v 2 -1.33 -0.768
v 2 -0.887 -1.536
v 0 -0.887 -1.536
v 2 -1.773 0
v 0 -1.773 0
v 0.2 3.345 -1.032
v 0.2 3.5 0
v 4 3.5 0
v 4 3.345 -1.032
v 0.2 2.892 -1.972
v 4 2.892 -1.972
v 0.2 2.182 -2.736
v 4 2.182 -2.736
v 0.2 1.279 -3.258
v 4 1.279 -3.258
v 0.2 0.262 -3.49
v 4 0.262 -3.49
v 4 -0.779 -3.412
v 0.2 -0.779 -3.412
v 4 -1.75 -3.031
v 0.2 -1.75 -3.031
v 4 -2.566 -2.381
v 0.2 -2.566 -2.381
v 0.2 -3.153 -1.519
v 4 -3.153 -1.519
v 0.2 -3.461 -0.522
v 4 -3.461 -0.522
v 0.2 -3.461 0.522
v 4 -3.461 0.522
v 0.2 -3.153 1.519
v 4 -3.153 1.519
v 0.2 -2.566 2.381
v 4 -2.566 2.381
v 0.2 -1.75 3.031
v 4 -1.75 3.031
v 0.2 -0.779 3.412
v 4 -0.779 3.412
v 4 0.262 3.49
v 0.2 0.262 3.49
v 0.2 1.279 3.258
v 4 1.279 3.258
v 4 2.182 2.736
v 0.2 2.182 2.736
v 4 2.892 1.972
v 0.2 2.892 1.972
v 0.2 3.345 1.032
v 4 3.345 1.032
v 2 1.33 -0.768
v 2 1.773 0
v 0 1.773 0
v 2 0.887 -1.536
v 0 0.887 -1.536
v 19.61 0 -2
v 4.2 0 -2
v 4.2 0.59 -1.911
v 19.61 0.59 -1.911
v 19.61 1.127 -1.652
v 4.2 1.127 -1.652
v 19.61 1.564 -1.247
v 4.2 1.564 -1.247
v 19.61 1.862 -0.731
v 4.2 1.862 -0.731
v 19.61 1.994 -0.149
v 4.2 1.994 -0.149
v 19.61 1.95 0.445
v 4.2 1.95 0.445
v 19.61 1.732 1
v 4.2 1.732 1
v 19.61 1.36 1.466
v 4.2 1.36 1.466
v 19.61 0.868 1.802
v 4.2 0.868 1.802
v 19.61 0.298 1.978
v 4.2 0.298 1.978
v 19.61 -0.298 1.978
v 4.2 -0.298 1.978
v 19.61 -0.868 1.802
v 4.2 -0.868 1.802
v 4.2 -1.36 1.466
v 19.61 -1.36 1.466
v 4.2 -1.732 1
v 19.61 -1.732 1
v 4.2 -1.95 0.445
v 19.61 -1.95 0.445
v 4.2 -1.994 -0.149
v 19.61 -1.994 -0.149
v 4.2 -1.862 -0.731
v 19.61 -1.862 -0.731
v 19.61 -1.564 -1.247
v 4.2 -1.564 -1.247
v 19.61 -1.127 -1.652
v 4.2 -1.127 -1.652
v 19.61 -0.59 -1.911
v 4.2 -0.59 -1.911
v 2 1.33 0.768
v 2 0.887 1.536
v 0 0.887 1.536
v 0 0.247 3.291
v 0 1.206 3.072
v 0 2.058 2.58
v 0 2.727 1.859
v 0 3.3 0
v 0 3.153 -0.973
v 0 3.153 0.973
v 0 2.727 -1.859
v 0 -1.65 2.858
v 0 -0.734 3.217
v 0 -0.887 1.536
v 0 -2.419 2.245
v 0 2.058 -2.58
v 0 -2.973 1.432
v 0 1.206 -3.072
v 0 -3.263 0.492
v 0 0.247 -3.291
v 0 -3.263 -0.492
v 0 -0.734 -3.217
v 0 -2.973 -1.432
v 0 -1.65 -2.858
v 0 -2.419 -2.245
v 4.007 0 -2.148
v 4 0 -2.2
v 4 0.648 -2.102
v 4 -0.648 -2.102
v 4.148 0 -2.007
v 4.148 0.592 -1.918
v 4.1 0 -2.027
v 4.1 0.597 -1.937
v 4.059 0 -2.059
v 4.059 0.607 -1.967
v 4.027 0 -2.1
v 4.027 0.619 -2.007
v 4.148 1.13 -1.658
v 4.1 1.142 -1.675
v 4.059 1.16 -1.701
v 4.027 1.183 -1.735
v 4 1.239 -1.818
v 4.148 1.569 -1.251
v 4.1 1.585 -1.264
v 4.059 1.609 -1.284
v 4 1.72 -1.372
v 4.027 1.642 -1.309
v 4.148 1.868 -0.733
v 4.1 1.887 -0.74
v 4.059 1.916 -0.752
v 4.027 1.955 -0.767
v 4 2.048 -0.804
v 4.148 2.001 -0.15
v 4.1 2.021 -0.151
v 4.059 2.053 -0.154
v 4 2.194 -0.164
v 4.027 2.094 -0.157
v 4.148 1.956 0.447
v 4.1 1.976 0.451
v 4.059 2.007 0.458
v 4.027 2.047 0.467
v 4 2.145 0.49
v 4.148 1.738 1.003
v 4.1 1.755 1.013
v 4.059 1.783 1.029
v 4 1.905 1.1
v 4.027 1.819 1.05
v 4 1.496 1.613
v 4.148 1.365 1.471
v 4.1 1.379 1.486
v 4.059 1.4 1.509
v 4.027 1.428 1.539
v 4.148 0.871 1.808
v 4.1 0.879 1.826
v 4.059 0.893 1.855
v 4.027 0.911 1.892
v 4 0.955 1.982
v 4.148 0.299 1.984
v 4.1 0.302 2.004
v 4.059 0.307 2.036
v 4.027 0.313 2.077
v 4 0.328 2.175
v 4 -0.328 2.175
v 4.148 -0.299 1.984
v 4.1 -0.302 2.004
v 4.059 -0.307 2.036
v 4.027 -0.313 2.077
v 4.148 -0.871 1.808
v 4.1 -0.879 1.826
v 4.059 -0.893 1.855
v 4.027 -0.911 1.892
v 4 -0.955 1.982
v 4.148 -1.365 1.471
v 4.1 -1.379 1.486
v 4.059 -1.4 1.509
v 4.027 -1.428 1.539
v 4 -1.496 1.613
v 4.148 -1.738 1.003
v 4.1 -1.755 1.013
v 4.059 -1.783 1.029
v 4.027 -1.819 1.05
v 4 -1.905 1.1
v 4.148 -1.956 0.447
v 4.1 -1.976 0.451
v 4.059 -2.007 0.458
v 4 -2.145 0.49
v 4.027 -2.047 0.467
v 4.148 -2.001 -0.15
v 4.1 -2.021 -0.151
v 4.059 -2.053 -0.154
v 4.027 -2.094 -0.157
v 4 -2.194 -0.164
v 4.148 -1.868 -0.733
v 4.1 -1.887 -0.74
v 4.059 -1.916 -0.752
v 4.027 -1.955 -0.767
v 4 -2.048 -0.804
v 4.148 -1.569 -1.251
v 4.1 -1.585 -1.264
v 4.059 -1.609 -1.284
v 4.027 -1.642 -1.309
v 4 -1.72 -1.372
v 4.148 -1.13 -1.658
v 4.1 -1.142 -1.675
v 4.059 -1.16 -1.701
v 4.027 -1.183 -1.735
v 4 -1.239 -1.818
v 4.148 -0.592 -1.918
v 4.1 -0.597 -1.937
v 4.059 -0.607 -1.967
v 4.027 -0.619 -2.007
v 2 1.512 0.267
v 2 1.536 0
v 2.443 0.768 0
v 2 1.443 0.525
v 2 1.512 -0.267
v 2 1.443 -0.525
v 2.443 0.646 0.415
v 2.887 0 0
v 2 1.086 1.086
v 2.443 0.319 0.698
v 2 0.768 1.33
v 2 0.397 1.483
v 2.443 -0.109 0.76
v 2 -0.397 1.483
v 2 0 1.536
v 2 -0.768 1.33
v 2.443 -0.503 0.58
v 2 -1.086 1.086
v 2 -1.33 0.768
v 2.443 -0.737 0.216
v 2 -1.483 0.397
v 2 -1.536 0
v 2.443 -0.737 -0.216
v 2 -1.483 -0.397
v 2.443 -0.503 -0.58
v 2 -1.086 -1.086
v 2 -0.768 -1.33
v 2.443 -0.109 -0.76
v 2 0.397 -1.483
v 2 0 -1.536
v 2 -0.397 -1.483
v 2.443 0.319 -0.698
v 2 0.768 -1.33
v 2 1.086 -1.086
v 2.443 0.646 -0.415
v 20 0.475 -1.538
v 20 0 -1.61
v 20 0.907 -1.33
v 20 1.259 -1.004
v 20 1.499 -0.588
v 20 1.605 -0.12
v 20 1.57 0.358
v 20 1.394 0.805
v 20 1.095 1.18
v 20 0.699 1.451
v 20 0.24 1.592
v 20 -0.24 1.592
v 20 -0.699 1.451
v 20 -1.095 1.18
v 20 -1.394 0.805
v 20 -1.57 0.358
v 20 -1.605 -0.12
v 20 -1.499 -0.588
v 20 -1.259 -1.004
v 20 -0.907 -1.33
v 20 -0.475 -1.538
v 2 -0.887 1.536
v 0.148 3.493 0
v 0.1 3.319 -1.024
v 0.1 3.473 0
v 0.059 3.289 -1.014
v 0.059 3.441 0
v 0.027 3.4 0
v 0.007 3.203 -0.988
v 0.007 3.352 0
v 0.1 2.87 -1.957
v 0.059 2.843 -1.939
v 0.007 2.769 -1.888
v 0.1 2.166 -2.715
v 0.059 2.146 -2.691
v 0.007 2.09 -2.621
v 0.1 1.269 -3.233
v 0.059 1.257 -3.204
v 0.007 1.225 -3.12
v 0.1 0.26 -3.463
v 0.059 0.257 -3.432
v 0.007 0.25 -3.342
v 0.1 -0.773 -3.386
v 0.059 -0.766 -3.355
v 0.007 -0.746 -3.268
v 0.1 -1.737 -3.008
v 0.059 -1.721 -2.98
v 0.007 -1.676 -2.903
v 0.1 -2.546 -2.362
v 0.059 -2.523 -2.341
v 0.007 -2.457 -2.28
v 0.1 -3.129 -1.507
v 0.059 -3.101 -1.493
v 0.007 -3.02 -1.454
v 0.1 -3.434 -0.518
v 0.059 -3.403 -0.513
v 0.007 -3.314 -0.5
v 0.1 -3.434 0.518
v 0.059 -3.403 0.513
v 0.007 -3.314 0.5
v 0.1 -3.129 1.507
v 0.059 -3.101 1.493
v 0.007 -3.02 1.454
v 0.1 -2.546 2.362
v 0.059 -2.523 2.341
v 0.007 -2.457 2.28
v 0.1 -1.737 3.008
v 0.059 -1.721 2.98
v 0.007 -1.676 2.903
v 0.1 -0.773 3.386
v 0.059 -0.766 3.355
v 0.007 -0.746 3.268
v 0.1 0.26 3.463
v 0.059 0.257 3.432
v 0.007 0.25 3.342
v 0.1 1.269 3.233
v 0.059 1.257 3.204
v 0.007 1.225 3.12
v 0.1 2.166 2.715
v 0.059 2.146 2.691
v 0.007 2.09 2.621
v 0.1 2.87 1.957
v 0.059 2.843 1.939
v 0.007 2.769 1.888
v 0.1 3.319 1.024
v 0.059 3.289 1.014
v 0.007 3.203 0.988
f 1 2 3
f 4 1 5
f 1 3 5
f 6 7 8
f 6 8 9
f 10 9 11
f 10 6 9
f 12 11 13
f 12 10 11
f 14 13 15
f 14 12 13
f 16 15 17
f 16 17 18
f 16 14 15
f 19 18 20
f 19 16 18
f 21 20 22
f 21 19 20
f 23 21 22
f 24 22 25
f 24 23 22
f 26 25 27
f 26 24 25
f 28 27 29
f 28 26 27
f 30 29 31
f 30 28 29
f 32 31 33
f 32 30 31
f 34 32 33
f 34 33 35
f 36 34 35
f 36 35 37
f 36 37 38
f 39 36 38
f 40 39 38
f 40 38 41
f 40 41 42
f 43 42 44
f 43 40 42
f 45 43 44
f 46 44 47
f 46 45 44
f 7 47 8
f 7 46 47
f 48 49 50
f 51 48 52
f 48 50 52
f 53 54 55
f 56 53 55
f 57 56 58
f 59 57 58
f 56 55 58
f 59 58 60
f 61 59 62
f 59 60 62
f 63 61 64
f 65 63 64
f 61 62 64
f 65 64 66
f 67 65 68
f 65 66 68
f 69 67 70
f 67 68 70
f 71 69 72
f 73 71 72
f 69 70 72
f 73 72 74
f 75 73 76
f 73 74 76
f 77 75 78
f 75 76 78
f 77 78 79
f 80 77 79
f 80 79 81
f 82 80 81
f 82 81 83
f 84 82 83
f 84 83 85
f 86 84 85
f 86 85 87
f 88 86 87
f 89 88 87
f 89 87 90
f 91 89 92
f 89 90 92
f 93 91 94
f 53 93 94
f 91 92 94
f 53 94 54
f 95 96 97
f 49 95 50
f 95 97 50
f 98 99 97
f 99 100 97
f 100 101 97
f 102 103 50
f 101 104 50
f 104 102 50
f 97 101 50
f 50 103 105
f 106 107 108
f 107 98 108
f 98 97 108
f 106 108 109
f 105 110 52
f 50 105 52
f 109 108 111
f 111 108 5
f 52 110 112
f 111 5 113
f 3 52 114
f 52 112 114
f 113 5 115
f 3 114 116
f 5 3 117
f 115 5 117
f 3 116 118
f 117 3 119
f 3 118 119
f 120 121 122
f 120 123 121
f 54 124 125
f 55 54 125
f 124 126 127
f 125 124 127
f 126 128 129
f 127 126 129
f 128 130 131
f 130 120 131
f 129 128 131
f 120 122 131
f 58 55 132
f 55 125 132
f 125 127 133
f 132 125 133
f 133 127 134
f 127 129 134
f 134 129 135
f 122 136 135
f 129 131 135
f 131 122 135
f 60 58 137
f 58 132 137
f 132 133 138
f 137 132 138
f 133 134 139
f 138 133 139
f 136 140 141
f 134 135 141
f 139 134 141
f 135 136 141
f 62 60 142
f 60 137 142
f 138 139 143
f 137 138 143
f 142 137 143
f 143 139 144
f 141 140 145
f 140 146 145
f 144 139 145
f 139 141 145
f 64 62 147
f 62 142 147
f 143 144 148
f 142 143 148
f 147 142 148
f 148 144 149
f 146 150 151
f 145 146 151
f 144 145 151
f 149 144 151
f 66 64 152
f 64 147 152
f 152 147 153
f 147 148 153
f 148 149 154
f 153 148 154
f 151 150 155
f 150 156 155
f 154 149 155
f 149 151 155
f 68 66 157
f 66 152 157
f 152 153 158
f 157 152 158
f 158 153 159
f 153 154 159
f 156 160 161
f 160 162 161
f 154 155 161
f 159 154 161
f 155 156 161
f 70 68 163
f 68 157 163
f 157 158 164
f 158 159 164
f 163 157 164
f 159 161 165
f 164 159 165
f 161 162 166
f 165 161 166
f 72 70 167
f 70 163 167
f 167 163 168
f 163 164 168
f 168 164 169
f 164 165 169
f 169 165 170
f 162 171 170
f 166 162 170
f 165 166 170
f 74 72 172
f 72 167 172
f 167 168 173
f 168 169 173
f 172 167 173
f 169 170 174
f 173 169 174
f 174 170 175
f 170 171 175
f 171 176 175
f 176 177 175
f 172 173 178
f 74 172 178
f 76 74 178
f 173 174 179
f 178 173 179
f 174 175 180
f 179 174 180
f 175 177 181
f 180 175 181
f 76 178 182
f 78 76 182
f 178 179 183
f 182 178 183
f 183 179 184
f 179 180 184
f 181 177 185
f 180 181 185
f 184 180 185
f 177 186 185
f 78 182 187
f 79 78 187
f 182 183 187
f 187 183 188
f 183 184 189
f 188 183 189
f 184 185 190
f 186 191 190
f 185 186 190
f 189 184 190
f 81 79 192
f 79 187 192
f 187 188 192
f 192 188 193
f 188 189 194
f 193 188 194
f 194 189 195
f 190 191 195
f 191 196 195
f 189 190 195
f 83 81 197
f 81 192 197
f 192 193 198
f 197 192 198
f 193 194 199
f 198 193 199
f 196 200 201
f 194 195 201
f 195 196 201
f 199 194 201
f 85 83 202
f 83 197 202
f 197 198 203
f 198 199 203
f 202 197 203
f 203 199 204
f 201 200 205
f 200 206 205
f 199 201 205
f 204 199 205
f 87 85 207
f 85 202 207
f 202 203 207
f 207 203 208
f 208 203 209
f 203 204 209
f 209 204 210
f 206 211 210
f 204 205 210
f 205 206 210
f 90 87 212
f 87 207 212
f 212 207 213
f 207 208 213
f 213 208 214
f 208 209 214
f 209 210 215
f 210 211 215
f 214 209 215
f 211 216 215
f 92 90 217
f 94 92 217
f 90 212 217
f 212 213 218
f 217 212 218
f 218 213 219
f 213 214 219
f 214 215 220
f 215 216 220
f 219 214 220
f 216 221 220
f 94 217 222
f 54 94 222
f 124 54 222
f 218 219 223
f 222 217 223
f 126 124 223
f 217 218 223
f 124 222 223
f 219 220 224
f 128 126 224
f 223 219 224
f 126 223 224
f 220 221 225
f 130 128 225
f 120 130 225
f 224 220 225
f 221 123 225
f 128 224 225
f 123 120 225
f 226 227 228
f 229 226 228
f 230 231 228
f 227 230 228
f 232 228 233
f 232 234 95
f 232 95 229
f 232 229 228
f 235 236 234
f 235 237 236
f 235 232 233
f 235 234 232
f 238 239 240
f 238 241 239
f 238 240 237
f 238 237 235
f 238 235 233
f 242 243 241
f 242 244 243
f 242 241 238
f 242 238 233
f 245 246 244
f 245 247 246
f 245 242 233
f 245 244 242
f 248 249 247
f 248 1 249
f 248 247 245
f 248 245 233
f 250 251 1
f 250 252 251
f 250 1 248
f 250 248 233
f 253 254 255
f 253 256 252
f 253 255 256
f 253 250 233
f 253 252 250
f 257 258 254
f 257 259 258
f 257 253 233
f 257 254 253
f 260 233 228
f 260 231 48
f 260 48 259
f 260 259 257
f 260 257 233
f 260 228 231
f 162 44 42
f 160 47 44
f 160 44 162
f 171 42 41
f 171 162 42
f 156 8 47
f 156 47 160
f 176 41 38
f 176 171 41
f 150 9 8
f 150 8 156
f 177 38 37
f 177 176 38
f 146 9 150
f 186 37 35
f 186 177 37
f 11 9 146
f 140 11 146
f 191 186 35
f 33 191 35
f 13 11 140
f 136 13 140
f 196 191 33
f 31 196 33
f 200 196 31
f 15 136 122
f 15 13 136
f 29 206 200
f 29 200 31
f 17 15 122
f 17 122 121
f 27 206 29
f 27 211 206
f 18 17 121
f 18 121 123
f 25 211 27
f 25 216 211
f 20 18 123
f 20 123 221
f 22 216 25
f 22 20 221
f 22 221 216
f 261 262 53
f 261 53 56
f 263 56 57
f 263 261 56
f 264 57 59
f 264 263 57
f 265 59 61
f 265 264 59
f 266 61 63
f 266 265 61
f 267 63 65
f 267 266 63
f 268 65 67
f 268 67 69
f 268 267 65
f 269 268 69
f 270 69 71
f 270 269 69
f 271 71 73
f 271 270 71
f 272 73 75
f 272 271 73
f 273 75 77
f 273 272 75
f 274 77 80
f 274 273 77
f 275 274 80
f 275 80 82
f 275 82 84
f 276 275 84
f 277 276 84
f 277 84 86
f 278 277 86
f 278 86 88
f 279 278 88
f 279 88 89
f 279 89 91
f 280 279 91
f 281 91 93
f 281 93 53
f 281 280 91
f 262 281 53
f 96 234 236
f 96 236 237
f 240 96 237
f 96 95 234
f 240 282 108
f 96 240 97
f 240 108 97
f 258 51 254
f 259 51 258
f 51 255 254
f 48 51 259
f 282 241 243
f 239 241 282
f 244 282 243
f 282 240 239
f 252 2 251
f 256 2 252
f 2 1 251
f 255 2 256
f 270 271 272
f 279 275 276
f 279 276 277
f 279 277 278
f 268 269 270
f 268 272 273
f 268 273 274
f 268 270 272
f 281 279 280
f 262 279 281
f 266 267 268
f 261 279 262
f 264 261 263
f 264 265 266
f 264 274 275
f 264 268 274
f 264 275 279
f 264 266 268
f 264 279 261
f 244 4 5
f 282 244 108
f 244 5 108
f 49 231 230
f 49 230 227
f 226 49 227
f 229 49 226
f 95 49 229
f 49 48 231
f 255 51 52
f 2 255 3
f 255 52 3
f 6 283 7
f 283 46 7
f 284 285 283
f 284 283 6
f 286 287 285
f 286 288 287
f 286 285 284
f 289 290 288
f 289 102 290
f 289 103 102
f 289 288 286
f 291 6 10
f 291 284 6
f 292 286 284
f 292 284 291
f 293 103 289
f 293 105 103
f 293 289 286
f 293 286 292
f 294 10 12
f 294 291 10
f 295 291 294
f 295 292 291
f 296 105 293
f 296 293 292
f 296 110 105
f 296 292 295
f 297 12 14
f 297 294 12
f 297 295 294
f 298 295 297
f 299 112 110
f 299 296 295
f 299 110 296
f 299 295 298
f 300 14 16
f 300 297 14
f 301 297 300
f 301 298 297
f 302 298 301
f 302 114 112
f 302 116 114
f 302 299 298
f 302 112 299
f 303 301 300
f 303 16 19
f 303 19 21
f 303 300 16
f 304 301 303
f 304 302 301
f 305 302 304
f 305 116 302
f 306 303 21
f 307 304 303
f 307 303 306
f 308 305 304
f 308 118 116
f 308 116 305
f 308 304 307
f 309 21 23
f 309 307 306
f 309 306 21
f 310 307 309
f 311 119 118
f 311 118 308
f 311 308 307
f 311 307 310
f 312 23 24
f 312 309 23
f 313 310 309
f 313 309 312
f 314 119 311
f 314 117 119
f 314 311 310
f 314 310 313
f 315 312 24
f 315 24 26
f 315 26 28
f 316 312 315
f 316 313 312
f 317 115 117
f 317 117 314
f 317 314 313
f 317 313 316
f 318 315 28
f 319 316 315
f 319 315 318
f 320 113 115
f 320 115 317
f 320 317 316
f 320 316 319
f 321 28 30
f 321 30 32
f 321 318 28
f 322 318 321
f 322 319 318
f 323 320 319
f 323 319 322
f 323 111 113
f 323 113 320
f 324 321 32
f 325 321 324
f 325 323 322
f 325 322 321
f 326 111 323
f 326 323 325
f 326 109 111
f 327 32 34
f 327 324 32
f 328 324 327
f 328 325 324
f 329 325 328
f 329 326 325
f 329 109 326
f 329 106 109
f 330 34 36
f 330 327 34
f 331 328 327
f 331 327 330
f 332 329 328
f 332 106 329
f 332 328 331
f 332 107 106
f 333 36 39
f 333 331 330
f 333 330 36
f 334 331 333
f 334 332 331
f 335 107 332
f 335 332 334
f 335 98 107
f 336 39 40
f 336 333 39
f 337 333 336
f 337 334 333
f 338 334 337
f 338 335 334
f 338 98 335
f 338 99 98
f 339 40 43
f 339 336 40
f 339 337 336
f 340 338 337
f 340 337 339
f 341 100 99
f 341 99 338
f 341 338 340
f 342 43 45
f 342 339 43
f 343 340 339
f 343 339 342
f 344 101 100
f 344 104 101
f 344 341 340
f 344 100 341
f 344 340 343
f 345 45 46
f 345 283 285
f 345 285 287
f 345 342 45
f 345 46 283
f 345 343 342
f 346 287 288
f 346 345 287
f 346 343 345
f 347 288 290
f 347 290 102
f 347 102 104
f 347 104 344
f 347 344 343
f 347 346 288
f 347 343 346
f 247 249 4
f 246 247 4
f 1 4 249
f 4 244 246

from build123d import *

# Parameters (mm, degrees)
ESBO_O1_W                = 4
ESBO_O1_H                = 3.5
ESBO_O2_R                = 2
RESSALTO_EXTRUS_O1_DEPTH = 16
CORTE_EXTRUS_O1_DEPTH    = 2
CHANFRO1_SIZE            = 0.39
FILETE1_R                = 0.2


with BuildPart() as part:
    # Esboço1 → Revolução1 (revolve)
    with BuildSketch(Plane(origin=(0, 0, 0), x_dir=(-1, 0, 0), z_dir=(0, 0, -1))):
        with Locations((-2, 1.75)):
            Rectangle(ESBO_O1_W, ESBO_O1_H)
    revolve(axis=Axis((4, 0, 0), (-1, 0, 0)))

    # Esboço2 → Ressalto-extrusão1 (add)
    with BuildSketch(Plane(origin=(4, 0, 0), x_dir=(0, 0, -1), z_dir=(1, 0, 0))):
        Circle(ESBO_O2_R)
    extrude(amount=RESSALTO_EXTRUS_O1_DEPTH)

    # Esboço3 → Corte-extrusão1 (cut)
    with BuildSketch(Plane.ZY):
        Polygon((0, -1.773042677), (1.5355, -0.886521338), (1.5355, 0.886521338), (0, 1.773042677), (-1.5355, 0.886521338), (-1.5355, -0.886521338), align=None)
    extrude(amount=-CORTE_EXTRUS_O1_DEPTH, mode=Mode.SUBTRACT)

    # Esboço4 → Corte-Revolução1 (revolve, cut)
    with BuildSketch(Plane.XY):
        Polygon((2, 1.5355), (2, 0), (2.886521338, 0), align=None)
    revolve(axis=Axis((2, 0, 0), (1, 0, 0)), mode=Mode.SUBTRACT)

    # Chanfro1
    chanfro1_edges = [part.edges().sort_by_distance(p)[0] for p in [
        (20, 0, 2),
    ]]
    chamfer(chanfro1_edges, length=CHANFRO1_SIZE)

    # Filete1
    filete1_edges = [part.edges().sort_by_distance(p)[0] for p in [
        (0, -3.5, 0),
        (4, 0, 2),
    ]]
    fillet(filete1_edges, radius=FILETE1_R)


solid = part.part
